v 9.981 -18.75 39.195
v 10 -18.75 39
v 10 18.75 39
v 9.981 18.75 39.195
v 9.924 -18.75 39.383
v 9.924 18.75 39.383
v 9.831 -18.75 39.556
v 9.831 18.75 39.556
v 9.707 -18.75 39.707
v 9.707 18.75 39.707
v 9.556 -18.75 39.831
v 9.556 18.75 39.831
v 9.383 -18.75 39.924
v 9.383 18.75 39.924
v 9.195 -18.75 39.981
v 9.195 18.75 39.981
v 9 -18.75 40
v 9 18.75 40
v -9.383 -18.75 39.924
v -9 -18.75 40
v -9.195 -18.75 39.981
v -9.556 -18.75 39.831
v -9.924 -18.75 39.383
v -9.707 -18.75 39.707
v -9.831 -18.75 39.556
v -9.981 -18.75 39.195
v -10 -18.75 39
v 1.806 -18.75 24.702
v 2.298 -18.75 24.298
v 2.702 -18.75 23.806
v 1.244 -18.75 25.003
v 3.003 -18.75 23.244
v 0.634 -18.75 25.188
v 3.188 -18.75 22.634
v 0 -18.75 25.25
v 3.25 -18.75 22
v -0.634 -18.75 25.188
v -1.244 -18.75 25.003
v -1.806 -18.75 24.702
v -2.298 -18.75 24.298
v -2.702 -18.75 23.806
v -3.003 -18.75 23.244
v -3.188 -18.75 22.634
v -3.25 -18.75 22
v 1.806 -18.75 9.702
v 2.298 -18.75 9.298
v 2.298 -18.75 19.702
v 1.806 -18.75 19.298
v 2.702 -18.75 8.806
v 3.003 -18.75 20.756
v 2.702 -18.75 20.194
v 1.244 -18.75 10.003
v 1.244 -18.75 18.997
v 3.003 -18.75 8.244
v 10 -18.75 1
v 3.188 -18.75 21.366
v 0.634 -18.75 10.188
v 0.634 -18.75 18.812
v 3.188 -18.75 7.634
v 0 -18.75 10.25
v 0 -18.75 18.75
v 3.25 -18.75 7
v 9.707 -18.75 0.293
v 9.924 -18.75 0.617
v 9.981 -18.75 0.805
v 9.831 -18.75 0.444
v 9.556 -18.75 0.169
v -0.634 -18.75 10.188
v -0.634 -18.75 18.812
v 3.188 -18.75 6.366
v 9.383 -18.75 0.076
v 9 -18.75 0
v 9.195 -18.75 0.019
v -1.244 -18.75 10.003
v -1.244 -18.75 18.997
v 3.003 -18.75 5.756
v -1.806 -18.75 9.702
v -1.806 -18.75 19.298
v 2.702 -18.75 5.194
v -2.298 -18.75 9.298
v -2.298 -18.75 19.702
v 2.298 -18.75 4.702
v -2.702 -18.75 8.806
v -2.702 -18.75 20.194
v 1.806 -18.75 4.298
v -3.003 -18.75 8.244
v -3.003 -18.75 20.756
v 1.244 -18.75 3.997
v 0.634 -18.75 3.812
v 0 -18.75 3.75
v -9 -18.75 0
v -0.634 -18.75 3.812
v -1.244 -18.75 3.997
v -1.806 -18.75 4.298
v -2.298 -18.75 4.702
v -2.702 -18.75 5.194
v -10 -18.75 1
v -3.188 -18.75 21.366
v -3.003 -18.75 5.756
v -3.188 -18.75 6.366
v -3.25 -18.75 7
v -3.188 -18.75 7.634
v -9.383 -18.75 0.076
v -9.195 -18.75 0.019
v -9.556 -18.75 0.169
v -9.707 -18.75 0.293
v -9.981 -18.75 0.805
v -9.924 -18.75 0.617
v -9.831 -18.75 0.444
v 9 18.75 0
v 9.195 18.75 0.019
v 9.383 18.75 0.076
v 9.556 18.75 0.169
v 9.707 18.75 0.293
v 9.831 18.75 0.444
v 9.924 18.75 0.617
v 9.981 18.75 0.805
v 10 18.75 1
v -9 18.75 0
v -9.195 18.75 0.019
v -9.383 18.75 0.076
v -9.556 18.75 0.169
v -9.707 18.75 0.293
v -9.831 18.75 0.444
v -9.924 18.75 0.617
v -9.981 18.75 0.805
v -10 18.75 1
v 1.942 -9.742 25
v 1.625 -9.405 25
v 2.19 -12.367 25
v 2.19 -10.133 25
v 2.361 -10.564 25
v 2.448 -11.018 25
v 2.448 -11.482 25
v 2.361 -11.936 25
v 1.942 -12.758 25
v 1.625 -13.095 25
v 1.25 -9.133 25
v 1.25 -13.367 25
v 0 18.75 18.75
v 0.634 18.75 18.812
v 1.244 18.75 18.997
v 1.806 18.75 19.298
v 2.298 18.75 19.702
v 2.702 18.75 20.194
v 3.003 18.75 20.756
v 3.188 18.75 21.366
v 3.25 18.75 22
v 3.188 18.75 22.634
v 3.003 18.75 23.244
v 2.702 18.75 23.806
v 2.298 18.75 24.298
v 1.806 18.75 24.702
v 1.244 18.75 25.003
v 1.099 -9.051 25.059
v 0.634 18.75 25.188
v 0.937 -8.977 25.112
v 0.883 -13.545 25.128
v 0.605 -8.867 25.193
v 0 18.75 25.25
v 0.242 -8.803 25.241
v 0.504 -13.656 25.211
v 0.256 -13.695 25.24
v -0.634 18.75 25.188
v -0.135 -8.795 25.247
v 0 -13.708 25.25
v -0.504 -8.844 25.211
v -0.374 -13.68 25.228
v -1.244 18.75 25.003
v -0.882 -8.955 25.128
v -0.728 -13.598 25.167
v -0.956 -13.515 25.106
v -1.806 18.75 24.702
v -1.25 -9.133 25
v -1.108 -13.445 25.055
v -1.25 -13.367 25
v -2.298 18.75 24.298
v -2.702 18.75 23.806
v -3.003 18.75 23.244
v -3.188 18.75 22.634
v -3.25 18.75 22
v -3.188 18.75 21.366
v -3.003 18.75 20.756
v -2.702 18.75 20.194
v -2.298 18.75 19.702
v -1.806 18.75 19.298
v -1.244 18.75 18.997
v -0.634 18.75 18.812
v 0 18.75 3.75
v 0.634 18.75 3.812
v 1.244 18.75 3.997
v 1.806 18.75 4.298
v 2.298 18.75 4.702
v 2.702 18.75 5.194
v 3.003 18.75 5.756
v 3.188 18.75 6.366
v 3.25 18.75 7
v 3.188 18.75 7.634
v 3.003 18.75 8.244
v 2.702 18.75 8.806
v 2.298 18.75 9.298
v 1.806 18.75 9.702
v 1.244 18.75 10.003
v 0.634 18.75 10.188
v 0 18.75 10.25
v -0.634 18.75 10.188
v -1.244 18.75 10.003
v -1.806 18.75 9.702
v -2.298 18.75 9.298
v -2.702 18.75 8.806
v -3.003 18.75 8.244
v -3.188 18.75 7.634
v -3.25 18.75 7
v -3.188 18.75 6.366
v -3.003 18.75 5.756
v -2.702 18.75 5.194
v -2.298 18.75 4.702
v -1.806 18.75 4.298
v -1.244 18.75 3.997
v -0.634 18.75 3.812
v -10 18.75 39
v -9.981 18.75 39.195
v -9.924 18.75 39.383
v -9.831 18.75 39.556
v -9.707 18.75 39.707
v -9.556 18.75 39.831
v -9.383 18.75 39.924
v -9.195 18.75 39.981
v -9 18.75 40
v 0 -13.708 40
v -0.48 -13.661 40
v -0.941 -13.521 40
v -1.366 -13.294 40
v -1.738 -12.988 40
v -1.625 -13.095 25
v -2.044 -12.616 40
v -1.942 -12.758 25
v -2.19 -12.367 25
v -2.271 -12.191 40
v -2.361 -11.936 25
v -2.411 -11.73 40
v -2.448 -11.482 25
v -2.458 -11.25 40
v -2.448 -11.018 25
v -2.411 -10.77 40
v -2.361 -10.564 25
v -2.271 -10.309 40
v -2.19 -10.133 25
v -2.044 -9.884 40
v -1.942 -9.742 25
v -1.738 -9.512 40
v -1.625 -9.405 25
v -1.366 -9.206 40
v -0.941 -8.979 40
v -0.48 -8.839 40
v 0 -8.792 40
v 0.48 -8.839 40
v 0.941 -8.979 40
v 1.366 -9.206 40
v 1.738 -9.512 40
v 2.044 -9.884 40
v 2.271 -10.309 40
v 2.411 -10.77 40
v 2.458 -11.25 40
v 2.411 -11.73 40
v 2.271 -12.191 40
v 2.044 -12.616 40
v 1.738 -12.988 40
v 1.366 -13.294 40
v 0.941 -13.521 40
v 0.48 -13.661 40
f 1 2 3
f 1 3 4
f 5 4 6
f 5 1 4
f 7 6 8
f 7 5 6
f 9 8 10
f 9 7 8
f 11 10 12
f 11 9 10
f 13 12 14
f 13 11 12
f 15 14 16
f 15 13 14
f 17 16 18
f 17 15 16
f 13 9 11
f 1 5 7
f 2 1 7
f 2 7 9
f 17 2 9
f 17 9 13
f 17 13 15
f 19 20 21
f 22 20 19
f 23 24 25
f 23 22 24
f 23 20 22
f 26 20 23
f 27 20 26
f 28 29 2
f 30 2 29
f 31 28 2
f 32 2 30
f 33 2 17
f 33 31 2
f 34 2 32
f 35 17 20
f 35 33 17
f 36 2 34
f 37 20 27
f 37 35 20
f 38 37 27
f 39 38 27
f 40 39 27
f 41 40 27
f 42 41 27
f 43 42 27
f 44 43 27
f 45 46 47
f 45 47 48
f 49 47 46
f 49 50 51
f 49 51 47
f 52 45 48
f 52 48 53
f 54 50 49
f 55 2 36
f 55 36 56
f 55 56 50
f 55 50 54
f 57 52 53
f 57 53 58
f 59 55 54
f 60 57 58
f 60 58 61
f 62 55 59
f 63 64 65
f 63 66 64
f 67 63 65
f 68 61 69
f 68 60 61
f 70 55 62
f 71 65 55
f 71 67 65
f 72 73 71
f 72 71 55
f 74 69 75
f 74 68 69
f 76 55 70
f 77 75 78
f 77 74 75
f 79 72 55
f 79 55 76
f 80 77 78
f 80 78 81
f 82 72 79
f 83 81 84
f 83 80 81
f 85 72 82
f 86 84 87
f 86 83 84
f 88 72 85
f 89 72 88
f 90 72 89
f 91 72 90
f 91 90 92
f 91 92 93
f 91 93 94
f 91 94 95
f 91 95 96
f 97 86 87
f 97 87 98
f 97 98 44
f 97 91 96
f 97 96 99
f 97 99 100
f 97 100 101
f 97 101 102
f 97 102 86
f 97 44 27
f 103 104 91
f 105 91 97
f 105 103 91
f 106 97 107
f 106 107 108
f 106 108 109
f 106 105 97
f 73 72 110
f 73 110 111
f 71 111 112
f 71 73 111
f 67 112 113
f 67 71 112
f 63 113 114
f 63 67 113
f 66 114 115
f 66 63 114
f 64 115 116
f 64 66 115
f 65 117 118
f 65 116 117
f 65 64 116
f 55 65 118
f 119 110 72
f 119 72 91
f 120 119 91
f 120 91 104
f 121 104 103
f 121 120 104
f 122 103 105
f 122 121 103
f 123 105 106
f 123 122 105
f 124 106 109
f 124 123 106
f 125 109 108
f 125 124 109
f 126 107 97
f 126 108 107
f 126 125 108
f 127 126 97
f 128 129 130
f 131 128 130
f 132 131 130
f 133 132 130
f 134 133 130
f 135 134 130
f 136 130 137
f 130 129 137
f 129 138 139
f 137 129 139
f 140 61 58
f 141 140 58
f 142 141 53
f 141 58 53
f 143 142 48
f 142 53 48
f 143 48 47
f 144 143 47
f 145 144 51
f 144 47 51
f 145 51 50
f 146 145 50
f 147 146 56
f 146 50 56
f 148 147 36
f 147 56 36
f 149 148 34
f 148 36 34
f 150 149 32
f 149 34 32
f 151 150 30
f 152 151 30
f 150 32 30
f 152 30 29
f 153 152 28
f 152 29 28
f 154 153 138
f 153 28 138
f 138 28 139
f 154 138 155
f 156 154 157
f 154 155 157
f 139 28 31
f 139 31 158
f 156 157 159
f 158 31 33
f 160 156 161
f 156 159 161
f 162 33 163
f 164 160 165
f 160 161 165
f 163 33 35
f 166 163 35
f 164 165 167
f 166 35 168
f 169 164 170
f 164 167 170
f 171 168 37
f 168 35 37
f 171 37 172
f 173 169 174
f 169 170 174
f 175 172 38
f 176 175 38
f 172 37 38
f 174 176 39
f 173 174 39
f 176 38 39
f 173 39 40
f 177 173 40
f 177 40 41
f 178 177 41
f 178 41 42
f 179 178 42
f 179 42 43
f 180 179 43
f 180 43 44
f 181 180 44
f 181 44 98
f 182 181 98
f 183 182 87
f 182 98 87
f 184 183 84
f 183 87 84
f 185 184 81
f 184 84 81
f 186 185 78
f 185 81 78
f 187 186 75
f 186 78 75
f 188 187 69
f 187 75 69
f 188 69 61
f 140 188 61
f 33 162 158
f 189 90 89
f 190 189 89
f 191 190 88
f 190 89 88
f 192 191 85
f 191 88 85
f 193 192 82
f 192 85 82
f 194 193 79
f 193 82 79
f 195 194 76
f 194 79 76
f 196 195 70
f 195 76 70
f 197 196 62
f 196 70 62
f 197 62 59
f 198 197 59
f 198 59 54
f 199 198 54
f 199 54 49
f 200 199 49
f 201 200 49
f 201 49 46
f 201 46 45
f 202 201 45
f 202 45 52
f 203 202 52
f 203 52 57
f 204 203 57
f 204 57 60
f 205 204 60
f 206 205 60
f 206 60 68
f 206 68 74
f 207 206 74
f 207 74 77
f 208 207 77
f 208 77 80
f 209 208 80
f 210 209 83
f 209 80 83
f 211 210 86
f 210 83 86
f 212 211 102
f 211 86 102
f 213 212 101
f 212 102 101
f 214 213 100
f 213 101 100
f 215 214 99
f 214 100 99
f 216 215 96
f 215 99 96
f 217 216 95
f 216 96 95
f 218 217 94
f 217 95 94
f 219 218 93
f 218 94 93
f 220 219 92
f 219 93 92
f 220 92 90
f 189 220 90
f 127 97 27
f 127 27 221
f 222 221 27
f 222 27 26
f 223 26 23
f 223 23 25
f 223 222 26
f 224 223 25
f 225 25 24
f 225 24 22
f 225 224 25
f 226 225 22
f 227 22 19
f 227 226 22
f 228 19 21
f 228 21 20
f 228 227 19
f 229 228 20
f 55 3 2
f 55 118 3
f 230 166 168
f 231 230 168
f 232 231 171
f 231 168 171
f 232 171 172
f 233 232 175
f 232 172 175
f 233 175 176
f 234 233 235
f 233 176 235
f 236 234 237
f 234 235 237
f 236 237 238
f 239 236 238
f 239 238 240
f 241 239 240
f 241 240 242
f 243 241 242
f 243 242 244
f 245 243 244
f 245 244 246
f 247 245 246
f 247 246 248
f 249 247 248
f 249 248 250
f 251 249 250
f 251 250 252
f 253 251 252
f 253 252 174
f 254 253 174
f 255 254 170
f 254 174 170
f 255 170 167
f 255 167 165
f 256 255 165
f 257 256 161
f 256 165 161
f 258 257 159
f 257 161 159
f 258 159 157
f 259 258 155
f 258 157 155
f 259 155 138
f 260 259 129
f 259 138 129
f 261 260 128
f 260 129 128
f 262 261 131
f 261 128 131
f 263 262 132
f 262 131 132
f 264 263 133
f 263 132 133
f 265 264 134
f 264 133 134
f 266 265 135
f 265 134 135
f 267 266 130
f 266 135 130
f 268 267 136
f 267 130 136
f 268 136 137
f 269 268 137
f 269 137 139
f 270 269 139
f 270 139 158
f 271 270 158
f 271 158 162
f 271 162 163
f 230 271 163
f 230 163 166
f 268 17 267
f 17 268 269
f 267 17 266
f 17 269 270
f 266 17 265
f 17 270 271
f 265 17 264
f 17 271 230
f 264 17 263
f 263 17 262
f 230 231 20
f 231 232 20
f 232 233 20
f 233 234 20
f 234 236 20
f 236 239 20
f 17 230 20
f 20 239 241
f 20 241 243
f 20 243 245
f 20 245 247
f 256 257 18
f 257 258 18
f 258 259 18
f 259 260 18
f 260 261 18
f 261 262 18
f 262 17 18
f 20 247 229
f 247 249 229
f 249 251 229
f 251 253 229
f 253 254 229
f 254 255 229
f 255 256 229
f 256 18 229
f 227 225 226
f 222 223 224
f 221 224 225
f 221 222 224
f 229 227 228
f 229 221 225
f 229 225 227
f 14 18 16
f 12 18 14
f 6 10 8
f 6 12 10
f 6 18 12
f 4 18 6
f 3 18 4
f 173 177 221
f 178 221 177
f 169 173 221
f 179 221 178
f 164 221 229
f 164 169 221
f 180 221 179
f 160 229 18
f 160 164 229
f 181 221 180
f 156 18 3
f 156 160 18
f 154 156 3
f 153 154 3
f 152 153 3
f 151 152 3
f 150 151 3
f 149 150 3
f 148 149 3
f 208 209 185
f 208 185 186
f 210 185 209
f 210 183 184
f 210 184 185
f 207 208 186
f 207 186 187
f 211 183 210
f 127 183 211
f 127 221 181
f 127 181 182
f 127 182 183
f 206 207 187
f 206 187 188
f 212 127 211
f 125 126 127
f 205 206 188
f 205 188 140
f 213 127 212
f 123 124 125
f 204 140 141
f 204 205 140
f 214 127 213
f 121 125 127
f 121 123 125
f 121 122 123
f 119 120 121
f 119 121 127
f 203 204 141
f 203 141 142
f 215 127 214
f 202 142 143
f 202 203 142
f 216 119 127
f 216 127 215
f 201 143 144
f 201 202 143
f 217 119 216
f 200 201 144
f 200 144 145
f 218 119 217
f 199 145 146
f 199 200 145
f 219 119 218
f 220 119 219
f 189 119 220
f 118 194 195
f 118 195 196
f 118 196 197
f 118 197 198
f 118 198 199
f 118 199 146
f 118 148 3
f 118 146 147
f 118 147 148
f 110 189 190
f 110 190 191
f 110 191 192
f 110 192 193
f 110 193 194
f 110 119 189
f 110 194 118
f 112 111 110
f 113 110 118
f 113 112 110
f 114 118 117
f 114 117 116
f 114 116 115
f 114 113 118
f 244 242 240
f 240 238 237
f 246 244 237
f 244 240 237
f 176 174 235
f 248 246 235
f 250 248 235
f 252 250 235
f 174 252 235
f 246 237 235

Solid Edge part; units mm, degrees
sketch "Sketch1" plane through (0, 0, 0) normal (0, 0, 1) x (1, 0, 0)
  line L0 (10, -18.75) -> (-10, -18.75)
  line L1 (-10, -18.75) -> (-10, 18.75)
  line L2 (-10, 18.75) -> (10, 18.75)
  line L3 (10, 18.75) -> (10, -18.75)
extrude "Protrusion1" add sketch "Sketch1" along normal blind 40
hole "Bohrung_6" at (0, -11.25, 40) direction (0, 0, -1) diameter 4.917 depth 15 thread major 6 thread length 10
fillet "Verrundung_1" radius 1 4 edges at (-10, 0, 40) (10, 0, 40) (-10, 0, 0) (10, 0, 0)
hole "Bohrung_4" at (0, -18.75, 22) direction (0, 1, 0) diameter 6.5 end through all
hole "Hole1" at (0, -18.75, 7) direction (0, 1, 0) diameter 6.5 end through all
